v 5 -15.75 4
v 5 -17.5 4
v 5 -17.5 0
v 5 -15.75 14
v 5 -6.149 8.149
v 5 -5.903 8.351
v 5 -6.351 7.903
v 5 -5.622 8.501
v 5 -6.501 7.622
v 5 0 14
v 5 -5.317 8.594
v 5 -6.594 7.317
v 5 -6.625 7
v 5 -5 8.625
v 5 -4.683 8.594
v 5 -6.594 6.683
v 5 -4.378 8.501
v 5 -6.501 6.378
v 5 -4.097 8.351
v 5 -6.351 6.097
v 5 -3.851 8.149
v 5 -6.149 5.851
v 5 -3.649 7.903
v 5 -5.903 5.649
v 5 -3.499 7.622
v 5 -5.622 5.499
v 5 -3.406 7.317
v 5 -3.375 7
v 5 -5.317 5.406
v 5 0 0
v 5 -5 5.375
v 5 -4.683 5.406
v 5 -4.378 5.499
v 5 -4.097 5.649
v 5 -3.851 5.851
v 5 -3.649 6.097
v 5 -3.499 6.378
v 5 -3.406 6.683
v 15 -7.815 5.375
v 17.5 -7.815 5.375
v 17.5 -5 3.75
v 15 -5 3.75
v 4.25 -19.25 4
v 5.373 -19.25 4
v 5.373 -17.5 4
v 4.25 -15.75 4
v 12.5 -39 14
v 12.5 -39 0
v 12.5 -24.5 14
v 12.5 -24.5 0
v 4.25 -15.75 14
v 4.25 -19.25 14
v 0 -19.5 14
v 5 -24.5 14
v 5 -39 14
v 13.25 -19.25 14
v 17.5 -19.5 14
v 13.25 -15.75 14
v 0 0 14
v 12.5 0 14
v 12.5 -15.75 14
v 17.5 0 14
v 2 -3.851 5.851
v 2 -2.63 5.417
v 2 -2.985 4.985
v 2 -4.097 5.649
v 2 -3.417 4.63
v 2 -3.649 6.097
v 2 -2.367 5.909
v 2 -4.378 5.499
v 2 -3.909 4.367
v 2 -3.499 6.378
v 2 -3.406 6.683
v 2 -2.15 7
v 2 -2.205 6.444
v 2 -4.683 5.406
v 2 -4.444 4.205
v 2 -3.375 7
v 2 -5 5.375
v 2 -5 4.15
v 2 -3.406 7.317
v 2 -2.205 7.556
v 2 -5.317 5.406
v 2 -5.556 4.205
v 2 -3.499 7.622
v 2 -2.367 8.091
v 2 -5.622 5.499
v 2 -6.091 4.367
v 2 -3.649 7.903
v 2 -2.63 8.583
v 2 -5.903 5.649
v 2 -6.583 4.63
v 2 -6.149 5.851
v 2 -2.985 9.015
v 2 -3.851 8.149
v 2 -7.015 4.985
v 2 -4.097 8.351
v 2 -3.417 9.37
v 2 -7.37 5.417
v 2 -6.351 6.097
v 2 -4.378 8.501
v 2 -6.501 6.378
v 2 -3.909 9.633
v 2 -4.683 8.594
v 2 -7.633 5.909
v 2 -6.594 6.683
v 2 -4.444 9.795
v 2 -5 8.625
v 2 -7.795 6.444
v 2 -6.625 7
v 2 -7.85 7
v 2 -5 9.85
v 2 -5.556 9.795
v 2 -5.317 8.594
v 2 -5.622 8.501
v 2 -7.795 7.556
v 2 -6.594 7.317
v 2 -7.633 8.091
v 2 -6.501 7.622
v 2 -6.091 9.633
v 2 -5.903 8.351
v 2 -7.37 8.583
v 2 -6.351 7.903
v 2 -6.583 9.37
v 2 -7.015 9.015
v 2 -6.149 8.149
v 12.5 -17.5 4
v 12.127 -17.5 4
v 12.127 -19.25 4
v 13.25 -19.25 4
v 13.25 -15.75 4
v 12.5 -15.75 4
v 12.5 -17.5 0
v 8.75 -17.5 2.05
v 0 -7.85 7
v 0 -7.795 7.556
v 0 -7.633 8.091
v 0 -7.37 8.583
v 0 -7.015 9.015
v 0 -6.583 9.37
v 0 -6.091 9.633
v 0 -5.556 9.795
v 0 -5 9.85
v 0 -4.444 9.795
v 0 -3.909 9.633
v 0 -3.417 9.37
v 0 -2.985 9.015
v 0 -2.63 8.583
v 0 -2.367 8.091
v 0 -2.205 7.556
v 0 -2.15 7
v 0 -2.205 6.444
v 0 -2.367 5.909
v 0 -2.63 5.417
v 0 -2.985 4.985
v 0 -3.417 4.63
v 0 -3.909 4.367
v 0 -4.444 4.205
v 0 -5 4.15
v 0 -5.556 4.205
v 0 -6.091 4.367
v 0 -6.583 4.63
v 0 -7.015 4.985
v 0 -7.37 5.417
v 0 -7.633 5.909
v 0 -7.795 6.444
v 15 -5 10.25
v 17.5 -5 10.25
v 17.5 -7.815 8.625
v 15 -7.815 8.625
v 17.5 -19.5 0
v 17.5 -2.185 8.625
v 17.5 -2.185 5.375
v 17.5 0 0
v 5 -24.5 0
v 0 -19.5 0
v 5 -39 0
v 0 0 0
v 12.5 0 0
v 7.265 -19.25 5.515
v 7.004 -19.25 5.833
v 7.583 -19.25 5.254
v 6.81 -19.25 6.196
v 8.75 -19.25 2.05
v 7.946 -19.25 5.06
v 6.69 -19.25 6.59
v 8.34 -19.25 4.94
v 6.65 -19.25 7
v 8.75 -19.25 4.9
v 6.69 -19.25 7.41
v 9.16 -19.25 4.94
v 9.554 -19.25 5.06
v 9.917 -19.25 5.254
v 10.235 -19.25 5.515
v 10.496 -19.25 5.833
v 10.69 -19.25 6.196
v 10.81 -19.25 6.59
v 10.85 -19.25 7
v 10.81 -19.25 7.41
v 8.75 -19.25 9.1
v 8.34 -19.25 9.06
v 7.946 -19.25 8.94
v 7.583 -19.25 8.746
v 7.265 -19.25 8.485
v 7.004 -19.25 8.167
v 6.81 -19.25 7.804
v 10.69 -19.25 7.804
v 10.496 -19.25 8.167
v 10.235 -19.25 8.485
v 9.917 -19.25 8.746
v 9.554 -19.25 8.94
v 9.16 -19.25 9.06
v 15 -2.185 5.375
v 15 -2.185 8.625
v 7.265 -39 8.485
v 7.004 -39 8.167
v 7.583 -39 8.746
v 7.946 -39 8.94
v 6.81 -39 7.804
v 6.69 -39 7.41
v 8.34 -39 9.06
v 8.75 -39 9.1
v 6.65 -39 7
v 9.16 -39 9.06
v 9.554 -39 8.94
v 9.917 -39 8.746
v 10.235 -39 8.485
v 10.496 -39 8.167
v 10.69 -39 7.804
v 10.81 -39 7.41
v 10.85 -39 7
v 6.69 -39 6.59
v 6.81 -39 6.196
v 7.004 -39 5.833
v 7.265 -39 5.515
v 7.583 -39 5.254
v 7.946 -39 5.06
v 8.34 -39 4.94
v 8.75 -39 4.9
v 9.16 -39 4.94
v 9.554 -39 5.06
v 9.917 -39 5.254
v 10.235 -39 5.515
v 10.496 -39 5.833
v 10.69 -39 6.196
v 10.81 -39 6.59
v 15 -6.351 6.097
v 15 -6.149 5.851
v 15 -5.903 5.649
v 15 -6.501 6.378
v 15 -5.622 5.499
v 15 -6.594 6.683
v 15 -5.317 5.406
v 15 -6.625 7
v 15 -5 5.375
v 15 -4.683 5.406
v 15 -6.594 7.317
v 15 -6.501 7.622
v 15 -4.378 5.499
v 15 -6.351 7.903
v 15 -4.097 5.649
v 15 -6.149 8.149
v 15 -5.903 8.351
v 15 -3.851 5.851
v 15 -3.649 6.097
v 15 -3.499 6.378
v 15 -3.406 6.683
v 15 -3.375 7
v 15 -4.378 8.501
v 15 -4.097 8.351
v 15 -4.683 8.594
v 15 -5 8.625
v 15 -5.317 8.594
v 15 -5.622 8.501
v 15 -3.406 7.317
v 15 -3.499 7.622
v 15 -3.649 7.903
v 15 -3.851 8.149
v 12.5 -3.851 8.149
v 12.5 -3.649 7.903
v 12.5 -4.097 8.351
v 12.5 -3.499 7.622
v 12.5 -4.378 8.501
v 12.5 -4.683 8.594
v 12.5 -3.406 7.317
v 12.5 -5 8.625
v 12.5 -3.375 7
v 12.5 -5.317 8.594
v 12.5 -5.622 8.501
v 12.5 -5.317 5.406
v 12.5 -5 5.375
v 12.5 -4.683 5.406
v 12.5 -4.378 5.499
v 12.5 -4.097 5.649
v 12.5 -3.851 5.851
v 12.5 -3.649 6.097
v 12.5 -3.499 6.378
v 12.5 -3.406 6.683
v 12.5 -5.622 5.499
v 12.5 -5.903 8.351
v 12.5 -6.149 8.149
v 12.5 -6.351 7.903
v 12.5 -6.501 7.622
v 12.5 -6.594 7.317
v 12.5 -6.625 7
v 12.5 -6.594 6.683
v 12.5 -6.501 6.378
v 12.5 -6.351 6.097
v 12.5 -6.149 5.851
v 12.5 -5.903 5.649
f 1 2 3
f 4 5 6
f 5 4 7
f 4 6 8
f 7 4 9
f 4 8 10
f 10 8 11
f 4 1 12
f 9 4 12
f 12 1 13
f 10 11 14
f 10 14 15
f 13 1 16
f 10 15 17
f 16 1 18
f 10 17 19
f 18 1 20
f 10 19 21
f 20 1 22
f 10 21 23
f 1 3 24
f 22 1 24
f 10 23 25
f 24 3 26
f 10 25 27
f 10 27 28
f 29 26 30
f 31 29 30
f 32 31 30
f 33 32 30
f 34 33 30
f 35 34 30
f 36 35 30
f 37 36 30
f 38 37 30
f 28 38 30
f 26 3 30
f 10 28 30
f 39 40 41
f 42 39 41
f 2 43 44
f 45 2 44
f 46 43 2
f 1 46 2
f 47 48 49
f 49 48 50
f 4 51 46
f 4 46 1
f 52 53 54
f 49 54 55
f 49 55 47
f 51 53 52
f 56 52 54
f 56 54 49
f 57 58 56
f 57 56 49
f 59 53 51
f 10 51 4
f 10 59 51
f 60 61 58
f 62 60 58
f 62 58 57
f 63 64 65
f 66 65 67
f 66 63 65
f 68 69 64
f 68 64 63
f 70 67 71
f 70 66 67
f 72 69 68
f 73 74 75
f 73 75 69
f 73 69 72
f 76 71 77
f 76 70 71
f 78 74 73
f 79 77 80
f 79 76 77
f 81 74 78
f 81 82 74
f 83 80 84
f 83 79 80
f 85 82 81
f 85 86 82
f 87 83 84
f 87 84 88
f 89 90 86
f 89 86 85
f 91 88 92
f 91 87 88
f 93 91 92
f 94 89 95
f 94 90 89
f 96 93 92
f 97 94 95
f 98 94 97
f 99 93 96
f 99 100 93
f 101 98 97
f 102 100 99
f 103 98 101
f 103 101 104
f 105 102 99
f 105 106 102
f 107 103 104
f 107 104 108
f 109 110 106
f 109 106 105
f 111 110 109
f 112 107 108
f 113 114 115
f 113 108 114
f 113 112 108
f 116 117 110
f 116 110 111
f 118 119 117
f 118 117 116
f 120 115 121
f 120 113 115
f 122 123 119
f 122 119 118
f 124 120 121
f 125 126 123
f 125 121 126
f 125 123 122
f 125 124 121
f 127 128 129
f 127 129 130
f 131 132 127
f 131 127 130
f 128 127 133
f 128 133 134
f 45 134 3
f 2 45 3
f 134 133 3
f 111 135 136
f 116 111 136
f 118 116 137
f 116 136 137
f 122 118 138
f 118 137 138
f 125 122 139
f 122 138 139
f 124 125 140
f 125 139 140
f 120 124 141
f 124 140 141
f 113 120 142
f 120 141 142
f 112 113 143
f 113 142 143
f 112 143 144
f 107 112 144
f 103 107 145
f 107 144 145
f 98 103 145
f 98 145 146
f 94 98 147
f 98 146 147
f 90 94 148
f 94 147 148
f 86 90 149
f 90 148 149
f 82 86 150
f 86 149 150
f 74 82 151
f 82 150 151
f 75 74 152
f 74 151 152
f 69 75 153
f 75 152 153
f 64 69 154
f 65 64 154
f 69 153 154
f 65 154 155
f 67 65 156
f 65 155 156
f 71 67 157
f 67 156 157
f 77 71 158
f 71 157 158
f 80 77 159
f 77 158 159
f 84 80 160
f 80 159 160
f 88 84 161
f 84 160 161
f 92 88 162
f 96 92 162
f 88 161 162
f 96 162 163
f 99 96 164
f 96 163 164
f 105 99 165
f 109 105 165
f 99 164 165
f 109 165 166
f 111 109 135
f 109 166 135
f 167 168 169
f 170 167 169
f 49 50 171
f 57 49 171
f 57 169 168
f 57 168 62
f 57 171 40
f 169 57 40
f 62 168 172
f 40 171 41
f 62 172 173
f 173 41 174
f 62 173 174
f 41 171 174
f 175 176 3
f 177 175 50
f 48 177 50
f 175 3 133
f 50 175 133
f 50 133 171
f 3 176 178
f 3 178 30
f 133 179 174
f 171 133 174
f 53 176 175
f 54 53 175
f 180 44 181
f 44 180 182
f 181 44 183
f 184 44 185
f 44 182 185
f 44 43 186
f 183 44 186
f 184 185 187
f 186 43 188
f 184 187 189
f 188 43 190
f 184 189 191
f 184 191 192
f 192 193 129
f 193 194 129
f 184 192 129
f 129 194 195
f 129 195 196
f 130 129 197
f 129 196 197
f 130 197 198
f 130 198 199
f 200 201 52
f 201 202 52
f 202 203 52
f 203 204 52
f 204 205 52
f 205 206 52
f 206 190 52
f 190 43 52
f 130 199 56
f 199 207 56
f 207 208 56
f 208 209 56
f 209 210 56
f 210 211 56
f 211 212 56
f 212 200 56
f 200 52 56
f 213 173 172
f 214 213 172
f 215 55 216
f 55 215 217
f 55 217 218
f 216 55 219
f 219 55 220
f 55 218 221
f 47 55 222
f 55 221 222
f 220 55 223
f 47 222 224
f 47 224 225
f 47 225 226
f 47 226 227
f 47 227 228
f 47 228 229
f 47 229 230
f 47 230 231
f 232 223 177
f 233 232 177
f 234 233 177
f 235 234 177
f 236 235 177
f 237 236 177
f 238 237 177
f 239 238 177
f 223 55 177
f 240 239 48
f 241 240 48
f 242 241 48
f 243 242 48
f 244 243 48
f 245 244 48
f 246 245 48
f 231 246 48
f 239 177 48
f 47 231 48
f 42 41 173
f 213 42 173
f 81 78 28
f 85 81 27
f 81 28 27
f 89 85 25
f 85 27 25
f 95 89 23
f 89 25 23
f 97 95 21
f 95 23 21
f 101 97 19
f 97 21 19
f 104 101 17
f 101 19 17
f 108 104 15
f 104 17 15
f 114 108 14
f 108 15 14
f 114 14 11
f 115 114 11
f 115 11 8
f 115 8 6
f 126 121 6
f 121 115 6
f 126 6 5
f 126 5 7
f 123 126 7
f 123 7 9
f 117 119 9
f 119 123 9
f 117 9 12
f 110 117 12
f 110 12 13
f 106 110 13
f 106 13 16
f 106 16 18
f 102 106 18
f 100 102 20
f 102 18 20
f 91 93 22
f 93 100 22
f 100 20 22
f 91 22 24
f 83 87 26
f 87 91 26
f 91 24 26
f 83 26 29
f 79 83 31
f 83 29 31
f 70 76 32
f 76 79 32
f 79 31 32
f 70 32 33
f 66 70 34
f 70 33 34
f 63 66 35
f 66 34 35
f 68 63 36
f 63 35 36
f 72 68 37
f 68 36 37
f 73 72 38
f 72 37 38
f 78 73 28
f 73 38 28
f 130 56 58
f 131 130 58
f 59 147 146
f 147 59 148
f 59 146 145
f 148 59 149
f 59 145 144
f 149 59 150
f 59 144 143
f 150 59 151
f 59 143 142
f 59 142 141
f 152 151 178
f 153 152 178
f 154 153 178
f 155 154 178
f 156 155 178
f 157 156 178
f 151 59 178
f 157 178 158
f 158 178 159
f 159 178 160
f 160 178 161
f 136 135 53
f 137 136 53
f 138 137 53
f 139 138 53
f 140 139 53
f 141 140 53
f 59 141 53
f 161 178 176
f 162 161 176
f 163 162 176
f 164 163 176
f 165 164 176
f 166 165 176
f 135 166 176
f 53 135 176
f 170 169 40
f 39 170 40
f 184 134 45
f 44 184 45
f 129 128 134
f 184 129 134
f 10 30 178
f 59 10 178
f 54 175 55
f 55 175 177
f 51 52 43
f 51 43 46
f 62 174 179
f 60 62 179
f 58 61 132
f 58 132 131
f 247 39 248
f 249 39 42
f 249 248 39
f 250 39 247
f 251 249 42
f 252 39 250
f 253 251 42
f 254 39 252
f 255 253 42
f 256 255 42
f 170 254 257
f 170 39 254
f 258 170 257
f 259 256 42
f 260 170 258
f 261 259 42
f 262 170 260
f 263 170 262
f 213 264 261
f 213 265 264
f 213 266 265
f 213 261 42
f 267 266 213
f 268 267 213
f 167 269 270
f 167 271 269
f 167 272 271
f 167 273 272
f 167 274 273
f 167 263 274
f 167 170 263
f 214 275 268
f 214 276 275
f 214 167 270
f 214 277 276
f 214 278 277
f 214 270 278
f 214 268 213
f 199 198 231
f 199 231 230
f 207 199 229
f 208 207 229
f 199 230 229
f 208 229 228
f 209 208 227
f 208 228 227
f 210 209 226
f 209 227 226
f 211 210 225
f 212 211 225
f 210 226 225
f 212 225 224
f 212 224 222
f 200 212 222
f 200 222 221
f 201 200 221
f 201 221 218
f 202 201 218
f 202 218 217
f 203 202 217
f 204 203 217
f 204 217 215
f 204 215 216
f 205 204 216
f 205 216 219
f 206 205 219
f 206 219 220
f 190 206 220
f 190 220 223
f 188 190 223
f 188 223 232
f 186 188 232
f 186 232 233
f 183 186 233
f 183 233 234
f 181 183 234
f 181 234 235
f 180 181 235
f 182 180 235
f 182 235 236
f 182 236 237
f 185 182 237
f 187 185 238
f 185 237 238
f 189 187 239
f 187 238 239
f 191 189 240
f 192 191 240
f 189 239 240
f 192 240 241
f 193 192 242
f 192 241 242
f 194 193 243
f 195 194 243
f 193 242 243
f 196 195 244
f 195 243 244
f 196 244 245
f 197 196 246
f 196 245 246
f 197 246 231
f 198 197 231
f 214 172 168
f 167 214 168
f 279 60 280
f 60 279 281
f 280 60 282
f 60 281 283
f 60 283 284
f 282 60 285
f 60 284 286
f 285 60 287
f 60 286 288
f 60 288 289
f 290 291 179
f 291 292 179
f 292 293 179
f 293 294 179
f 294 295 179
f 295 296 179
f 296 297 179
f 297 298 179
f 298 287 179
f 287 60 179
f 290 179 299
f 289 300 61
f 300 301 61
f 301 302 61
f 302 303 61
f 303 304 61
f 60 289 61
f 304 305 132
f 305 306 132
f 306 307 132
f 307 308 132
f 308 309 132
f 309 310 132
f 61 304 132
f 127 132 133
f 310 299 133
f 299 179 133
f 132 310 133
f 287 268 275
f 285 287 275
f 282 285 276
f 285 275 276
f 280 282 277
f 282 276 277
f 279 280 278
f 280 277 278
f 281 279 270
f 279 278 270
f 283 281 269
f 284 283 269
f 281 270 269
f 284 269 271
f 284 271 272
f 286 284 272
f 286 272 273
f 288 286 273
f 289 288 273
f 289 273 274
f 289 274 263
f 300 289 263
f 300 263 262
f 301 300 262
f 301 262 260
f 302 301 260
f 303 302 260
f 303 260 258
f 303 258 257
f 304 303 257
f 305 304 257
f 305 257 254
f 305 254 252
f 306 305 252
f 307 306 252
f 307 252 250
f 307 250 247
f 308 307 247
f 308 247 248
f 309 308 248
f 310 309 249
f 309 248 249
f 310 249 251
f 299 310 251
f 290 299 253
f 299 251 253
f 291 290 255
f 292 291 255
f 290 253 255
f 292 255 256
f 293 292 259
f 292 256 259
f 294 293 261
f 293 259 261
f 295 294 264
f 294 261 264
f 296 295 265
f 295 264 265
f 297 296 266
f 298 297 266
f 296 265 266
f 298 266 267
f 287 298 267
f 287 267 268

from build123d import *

# Parameters (mm, degrees)
F1_DEPTH  = 14
F2_R      = 2.1
F3_DEPTH  = 25
F5_W      = 9
F5_H      = 3.5
F6_DEPTH  = 10
F4_R      = 2.1
F7_DEPTH  = 1.75
F8_R      = 1.625
F9_DEPTH  = 2.5
F10_DEPTH = 25
F11_R     = 2.85
F11_R_2   = 1.625
F12_DEPTH = 2


with BuildPart() as f1:
    # F0 (on Top) → F1 (new body)
    with BuildSketch(Plane.XY):
        Polygon((5, 0), (0, 0), (0, -19.5), (5, -24.5), (5, -39), (12.5, -39), (12.5, -24.5), (17.5, -19.5), (17.5, 0), (12.5, 0), (12.5, -17.5), (5, -17.5), align=None)
    extrude(amount=F1_DEPTH)

    # F2 (on face) → F3 (cut)
    with BuildSketch(Plane.XZ.offset(39)):
        with Locations((8.75, 7)):
            Circle(F2_R)
    extrude(amount=-F3_DEPTH, mode=Mode.SUBTRACT)

    # F5 (on face) → F6 (cut)
    with BuildSketch(Plane.XY.offset(14)):
        with Locations((8.75, -17.5)):
            Rectangle(F5_W, F5_H)
    extrude(amount=-F6_DEPTH, mode=Mode.SUBTRACT)

    # F4 (on face) → F7 (cut)
    with BuildSketch(Plane(origin=(0, -17.5, 0), x_dir=(-1, 0, 0), z_dir=(0, 1, 0))):
        Polygon((-5, 4.2150635095), (-5, 9.7849364905), (-8.75, 11.95), (-12.5, 9.7849364905), (-12.5, 4.2150635095), (-8.75, 2.05), align=None)
        with Locations((-8.75, 7)):
            Circle(F4_R, mode=Mode.SUBTRACT)
    extrude(amount=-F7_DEPTH, mode=Mode.SUBTRACT)

    # F8 (on face) → F9 (cut)
    with BuildSketch(Plane.YZ.offset(17.5)):
        Polygon((-2.1854174377, 5.375), (-2.1854174377, 8.625), (-5, 10.25), (-7.8145825623, 8.625), (-7.8145825623, 5.375), (-5, 3.75), align=None)
        with Locations((-5, 7)):
            Circle(F8_R, mode=Mode.SUBTRACT)
    extrude(amount=-F9_DEPTH, mode=Mode.SUBTRACT)

    # F10 (cut): a face of the model
    f10_faces = [f1.faces().sort_by_distance(p)[0] for p in [
        (17.5, -5, 7),
    ]]
    extrude(f10_faces, amount=-F10_DEPTH, mode=Mode.SUBTRACT)

    # F11 (on face) → F12 (cut)
    with BuildSketch(Plane(origin=(0, 0, 0), x_dir=(0, -1, 0), z_dir=(-1, 0, 0))):
        with Locations((5, 7)):
            Circle(F11_R)
        with Locations((5, 7)):
            Circle(F11_R_2, mode=Mode.SUBTRACT)
    extrude(amount=-F12_DEPTH, mode=Mode.SUBTRACT)


solid = f1.part
